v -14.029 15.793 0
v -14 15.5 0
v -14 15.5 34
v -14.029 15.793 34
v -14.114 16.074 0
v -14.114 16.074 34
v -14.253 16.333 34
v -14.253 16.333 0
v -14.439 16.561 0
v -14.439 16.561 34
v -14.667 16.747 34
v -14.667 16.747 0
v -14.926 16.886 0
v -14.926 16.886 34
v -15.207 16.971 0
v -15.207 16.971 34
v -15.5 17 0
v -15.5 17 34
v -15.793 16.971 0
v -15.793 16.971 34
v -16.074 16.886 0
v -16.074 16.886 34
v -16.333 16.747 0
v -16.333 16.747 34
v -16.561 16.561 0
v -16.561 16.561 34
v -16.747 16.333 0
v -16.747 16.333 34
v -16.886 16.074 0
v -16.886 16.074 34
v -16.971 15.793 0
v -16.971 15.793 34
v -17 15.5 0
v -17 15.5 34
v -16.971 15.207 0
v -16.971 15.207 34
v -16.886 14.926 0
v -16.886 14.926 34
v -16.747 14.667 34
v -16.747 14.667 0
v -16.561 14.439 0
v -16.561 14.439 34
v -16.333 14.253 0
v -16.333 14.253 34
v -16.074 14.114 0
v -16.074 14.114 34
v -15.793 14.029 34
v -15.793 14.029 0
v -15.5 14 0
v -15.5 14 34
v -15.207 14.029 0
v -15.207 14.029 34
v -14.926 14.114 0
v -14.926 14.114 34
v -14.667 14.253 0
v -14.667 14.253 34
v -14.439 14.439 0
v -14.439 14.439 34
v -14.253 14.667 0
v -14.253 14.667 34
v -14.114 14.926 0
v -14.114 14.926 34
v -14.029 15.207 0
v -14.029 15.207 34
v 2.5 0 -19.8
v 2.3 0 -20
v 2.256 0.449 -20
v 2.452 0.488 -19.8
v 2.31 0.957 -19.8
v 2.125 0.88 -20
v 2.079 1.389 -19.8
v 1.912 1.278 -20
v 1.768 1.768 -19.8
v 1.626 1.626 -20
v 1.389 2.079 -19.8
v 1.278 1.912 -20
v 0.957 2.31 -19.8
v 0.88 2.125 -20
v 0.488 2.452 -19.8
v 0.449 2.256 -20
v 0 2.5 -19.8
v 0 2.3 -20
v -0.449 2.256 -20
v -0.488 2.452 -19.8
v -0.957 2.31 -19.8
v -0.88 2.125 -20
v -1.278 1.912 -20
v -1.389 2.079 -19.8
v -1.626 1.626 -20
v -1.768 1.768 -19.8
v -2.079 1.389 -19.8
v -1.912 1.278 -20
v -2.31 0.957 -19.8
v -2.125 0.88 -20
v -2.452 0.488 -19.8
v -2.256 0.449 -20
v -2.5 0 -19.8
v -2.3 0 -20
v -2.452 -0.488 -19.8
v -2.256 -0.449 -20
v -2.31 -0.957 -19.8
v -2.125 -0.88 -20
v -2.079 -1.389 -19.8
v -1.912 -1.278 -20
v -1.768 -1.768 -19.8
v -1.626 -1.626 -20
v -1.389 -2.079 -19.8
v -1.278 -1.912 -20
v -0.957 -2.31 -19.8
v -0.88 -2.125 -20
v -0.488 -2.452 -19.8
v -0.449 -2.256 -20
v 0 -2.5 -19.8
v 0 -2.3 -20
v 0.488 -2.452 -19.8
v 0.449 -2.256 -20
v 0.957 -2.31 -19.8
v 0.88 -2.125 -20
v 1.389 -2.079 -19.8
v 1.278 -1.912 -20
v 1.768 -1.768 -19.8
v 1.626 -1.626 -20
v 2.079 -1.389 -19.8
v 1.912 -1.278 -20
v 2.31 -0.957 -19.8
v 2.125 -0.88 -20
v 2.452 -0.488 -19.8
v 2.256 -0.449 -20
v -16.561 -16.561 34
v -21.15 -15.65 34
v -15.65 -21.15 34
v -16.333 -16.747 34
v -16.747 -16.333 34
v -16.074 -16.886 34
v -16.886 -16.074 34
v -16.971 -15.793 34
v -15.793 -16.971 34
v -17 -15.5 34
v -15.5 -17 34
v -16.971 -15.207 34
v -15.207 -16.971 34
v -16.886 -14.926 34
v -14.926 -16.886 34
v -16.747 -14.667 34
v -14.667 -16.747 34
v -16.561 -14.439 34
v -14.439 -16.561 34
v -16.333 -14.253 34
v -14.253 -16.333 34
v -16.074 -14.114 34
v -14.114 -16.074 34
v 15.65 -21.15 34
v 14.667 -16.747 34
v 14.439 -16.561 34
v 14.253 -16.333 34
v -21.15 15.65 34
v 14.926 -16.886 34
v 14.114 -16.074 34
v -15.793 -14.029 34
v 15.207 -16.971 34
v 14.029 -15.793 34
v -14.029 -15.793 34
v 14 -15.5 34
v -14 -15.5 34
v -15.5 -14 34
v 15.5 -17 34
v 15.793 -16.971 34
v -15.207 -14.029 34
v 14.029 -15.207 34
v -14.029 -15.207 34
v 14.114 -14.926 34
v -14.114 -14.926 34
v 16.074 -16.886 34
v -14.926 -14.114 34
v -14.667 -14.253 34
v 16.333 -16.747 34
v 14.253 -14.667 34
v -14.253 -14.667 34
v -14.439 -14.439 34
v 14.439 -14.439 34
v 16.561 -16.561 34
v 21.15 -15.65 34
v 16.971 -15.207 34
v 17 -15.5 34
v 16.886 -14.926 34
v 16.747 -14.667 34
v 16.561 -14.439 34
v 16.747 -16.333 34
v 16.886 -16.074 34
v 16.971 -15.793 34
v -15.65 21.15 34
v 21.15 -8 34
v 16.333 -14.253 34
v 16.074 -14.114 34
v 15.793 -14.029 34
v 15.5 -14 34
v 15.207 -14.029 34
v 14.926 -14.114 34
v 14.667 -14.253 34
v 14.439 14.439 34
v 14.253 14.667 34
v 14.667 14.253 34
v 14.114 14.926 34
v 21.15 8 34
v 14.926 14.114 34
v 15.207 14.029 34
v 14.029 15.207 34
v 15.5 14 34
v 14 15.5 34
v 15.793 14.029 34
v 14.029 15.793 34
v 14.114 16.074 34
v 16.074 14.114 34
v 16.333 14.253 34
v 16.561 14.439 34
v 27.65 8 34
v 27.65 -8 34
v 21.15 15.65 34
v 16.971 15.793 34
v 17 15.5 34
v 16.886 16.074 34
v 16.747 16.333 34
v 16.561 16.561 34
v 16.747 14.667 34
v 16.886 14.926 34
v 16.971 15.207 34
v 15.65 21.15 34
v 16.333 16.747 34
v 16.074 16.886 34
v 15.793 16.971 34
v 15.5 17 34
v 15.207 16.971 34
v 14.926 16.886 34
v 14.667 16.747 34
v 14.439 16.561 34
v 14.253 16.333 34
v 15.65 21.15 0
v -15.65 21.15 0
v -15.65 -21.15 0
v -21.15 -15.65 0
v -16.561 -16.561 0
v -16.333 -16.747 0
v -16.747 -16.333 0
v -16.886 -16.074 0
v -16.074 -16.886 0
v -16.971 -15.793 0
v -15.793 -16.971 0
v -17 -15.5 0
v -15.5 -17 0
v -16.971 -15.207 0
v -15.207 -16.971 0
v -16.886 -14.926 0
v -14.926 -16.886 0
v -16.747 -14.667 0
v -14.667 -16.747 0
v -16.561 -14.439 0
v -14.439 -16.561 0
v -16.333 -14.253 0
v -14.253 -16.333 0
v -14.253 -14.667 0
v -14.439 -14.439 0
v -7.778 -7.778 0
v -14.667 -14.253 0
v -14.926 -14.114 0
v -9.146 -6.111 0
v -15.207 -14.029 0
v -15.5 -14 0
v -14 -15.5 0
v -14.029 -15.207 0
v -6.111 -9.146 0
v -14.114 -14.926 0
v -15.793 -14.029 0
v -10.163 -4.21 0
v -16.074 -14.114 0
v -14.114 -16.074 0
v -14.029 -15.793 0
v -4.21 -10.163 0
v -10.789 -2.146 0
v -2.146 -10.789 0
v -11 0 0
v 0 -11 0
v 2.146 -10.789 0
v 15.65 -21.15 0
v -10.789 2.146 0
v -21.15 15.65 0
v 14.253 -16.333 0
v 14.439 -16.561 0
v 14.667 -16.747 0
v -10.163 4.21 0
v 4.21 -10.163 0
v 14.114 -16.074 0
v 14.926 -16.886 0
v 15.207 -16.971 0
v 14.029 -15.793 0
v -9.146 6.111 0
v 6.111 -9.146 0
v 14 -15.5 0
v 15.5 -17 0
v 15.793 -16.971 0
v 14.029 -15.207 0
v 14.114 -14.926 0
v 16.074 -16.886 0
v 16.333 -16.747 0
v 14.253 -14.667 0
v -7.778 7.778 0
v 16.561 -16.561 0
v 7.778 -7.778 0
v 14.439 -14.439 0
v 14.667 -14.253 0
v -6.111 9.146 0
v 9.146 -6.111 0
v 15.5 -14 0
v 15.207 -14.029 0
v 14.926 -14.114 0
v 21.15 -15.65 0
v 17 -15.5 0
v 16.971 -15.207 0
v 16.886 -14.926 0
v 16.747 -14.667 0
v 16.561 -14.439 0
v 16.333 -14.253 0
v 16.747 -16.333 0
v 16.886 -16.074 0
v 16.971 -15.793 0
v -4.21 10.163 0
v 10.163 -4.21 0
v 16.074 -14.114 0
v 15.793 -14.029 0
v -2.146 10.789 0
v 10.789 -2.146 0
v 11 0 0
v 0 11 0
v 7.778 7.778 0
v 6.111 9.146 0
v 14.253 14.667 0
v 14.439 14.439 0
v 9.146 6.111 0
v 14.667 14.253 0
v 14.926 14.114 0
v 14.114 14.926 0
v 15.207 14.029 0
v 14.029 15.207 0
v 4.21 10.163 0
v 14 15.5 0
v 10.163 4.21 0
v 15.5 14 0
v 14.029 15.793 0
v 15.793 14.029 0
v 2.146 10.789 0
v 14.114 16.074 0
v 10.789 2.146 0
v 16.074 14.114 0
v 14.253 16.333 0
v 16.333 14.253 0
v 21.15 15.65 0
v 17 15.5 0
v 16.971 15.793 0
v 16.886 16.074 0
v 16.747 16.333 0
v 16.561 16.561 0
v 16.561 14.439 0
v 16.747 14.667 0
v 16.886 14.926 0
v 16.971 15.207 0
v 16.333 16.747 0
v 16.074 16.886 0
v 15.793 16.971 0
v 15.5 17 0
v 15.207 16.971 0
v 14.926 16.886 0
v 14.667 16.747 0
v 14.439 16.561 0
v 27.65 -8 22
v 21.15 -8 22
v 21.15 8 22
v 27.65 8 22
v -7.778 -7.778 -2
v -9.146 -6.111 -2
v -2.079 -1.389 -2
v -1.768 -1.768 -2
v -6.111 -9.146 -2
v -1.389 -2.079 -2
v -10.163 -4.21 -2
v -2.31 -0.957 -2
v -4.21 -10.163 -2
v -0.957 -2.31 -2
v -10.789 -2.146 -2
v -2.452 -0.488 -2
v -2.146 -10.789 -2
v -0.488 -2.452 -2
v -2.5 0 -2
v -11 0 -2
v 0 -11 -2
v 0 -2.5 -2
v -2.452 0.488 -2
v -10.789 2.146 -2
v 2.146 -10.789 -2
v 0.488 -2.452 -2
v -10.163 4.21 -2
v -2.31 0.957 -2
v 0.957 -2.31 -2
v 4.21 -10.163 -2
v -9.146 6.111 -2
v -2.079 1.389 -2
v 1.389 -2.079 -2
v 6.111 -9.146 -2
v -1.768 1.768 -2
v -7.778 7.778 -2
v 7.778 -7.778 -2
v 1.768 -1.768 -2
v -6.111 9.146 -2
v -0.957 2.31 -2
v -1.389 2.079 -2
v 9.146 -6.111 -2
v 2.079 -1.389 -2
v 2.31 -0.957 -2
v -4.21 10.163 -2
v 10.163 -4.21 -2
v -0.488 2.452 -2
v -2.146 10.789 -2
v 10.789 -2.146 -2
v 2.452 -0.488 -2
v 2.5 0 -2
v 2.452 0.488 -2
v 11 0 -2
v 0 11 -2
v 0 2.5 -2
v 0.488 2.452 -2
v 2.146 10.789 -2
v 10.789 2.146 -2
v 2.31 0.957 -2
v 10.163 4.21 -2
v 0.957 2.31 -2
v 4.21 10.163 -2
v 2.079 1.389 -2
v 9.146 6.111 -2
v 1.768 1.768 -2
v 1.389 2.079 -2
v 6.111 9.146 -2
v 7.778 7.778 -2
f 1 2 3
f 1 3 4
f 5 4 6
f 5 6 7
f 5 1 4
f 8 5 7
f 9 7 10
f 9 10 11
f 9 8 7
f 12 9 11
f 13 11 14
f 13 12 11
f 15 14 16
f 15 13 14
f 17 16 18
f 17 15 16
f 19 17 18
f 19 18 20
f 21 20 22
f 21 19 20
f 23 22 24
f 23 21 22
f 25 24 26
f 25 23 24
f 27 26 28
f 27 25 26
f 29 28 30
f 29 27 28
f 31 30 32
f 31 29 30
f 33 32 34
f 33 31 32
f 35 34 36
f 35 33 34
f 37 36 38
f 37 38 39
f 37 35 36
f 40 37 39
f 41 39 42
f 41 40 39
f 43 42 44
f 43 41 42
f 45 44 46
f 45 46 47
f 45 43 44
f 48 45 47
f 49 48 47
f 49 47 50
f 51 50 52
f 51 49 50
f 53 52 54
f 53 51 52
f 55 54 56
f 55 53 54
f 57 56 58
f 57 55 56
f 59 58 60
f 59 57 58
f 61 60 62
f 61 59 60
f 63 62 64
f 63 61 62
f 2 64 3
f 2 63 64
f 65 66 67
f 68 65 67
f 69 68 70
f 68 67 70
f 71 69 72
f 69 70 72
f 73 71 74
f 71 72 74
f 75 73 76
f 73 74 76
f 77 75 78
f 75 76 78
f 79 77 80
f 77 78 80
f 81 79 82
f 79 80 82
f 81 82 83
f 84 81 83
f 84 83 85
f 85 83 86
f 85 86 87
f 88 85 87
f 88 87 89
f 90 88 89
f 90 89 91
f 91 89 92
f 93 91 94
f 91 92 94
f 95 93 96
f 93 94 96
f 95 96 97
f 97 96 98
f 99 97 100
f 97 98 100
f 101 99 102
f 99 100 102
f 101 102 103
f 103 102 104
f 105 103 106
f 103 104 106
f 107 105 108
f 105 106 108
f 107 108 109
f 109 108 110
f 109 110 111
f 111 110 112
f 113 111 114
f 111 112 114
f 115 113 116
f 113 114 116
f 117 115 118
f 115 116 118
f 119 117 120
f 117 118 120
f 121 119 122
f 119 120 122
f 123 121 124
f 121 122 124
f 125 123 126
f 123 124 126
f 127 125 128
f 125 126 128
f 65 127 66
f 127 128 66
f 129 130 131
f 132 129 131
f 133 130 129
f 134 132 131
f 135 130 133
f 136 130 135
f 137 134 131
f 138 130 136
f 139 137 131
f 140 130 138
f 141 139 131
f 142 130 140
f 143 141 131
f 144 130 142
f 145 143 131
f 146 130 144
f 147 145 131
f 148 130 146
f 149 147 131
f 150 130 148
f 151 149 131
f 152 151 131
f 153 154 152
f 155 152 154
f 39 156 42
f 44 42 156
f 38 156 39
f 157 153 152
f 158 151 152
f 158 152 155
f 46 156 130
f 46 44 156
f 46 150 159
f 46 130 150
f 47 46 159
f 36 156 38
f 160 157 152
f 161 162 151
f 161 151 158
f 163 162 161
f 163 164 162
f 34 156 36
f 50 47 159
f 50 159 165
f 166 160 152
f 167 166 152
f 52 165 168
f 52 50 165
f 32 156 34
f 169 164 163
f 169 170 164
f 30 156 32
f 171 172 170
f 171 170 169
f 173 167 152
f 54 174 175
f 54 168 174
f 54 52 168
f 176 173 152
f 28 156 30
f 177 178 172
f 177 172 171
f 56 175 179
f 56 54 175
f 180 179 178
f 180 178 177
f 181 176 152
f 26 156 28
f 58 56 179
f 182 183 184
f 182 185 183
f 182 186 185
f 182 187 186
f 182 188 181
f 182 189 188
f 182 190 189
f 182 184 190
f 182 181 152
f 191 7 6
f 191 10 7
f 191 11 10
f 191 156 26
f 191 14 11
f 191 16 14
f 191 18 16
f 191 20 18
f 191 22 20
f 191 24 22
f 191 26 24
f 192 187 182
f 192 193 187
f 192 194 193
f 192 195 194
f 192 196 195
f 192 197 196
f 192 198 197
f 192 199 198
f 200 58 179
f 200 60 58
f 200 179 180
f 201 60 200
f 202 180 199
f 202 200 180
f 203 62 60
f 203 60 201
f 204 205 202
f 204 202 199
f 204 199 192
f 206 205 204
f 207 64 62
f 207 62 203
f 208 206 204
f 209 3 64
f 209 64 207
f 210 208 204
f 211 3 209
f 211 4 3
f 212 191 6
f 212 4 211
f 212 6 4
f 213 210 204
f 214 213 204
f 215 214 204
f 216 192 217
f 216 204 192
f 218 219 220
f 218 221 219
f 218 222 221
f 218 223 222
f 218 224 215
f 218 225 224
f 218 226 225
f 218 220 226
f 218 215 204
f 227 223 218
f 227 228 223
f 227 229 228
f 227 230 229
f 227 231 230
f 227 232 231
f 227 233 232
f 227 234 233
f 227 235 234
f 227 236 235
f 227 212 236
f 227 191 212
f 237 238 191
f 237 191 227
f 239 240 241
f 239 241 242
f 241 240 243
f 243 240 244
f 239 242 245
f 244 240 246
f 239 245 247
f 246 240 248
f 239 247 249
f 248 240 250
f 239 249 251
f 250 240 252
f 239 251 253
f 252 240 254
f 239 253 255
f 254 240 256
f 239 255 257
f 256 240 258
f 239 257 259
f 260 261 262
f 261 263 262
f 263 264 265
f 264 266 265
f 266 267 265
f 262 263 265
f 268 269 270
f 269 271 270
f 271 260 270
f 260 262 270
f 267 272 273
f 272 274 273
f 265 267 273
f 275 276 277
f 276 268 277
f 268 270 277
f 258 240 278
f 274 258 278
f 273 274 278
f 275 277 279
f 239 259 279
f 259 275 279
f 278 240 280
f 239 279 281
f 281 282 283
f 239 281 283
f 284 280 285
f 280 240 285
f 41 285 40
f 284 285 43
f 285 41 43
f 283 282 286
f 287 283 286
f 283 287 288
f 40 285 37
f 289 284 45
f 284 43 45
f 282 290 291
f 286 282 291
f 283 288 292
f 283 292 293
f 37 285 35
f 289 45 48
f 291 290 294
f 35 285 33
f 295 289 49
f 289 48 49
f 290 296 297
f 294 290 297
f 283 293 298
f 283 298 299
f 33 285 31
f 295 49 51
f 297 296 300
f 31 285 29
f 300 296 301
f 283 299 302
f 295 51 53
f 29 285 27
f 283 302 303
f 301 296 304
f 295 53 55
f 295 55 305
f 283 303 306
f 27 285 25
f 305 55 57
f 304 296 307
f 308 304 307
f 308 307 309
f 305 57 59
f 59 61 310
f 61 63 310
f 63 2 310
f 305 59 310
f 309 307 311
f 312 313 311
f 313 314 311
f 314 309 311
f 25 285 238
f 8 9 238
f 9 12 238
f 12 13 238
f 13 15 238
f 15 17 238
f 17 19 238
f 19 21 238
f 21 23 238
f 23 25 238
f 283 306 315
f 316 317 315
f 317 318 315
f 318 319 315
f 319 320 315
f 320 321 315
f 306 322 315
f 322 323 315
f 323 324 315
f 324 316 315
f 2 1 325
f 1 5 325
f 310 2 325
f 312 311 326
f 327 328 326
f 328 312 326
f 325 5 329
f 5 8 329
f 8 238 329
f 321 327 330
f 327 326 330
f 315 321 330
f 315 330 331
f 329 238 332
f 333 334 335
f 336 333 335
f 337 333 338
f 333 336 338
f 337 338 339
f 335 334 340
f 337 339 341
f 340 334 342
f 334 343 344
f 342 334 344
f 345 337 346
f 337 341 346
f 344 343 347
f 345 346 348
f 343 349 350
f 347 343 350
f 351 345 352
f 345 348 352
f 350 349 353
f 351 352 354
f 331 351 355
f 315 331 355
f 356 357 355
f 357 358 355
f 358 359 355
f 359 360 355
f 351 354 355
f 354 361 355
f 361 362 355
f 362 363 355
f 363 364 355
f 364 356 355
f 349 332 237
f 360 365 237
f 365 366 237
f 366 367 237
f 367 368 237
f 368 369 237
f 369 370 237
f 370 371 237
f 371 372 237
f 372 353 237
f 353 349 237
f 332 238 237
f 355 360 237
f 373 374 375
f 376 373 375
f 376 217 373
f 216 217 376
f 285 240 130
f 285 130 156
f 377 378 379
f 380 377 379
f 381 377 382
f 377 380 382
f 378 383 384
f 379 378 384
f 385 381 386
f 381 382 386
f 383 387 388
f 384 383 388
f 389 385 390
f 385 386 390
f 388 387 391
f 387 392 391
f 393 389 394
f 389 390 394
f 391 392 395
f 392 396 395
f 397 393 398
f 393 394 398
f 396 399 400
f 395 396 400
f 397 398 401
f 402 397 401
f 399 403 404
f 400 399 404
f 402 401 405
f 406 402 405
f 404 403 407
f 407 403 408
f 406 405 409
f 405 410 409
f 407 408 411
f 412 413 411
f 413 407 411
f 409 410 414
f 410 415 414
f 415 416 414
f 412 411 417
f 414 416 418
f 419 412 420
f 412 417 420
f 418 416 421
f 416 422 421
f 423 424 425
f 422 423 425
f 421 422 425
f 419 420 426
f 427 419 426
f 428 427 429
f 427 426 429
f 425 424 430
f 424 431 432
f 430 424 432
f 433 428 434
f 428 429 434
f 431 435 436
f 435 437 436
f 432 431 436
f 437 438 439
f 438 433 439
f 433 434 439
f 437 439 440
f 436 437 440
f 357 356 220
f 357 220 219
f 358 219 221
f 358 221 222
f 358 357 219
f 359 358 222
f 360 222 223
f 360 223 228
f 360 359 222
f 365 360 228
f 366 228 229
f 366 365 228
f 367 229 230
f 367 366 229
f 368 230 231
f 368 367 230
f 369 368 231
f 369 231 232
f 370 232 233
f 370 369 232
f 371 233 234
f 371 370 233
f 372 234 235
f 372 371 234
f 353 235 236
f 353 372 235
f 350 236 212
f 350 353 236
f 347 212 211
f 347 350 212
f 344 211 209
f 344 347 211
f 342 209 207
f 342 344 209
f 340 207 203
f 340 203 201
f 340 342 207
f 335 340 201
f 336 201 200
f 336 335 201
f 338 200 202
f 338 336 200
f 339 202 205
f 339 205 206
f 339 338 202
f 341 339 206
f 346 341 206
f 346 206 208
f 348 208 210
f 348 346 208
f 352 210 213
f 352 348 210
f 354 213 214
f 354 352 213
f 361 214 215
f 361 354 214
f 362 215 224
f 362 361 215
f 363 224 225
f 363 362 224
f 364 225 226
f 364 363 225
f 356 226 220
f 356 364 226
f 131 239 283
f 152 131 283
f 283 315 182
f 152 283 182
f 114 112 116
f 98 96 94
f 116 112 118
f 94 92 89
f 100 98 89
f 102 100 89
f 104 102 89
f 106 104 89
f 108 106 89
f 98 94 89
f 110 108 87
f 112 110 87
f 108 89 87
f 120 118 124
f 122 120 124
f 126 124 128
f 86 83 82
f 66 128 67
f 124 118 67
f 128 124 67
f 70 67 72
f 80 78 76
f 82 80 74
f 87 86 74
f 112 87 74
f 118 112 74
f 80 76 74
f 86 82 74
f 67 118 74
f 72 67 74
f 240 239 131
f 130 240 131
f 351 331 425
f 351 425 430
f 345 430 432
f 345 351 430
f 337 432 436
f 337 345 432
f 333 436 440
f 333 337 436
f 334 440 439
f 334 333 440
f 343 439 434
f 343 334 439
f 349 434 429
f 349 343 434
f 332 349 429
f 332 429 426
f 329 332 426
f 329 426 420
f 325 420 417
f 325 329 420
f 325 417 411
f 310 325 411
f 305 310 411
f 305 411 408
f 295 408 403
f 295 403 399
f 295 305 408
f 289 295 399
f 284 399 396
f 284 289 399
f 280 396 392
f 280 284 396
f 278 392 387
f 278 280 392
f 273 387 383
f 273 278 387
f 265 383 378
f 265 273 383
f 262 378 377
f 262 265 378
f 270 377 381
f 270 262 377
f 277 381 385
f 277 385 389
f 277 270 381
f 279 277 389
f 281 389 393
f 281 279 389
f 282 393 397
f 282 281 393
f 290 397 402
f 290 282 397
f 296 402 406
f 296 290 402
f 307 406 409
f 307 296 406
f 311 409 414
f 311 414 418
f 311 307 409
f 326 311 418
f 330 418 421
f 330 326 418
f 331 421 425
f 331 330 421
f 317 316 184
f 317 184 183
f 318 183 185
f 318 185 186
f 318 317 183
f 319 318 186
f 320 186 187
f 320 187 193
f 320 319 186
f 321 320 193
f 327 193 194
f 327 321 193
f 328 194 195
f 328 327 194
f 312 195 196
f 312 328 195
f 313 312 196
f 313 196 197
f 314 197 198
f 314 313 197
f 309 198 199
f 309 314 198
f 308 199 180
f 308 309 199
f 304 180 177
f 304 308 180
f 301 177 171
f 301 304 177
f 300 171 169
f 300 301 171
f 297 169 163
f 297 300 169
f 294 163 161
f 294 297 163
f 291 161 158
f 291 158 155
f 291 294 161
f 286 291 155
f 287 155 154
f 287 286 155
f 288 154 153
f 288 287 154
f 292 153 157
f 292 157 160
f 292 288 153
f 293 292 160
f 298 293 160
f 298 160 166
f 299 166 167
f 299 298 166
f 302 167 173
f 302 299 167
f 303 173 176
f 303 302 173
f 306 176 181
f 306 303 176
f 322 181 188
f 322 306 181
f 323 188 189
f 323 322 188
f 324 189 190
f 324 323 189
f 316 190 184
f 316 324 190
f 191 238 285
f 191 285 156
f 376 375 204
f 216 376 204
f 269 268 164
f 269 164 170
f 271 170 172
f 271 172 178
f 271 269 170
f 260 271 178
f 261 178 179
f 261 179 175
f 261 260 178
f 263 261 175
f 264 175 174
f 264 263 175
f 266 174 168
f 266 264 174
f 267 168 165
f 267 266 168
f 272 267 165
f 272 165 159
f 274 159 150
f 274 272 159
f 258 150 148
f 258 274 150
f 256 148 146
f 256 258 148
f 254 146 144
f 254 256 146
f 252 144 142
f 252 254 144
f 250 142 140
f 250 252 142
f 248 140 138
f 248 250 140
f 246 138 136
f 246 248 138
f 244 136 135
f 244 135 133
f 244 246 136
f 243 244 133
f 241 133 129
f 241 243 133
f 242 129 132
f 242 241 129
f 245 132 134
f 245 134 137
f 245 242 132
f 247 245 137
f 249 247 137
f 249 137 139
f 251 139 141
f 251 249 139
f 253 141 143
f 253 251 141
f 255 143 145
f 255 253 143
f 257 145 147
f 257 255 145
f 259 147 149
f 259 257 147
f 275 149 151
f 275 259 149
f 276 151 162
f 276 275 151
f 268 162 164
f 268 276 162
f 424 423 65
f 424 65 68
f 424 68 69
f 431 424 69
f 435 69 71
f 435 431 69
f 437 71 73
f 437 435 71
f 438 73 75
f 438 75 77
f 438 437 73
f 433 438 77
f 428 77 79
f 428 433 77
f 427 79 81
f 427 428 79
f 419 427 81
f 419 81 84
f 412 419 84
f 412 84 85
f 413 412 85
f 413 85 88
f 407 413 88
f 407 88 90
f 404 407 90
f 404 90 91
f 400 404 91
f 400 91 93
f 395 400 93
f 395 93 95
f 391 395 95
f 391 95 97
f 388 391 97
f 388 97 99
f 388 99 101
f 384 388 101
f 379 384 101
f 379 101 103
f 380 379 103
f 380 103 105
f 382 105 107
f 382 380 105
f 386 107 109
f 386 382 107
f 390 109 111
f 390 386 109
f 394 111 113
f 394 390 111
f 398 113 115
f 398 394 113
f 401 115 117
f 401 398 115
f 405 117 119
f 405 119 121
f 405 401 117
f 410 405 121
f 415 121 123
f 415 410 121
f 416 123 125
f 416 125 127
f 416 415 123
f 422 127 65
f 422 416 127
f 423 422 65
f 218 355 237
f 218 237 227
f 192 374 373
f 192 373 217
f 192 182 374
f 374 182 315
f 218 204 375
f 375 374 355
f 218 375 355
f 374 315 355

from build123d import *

# Parameters (mm, degrees)
F0_W     = 42.3
F0_H     = 42.3
F0_R     = 1.5
F0_R_2   = 11
F0_R_3   = 2.5
F1_DEPTH = 34
F2_DEPTH = 2
F3_DEPTH = 20
F4_SIZE  = 5.5
F5_SIZE  = 0.2
F6_W     = 16
F6_H     = 12
F7_DEPTH = 6.5


with BuildPart() as f1:
    # F0 (on Top) → F1 (new body)
    with BuildSketch(Plane.XY):
        Rectangle(F0_W, F0_H)
        with Locations((-15.5, -15.5)):
            Circle(F0_R, mode=Mode.SUBTRACT)
        with Locations((15.5, -15.5)):
            Circle(F0_R, mode=Mode.SUBTRACT)
        with Locations((-15.5, 15.5)):
            Circle(F0_R, mode=Mode.SUBTRACT)
        Circle(F0_R_2, mode=Mode.SUBTRACT)
        with Locations((15.5, 15.5)):
            Circle(F0_R, mode=Mode.SUBTRACT)
        Circle(F0_R_2)
        Circle(F0_R_3, mode=Mode.SUBTRACT)
        Circle(F0_R_3)
    extrude(amount=F1_DEPTH)

    # F0 (on Top) → F2 (join)
    with BuildSketch(Plane.XY):
        Circle(F0_R_2)
        Circle(F0_R_3, mode=Mode.SUBTRACT)
    extrude(amount=-F2_DEPTH)

    # F0 (on Top) → F3 (join)
    with BuildSketch(Plane.XY):
        Circle(F0_R_3)
    extrude(amount=-F3_DEPTH)

    # F4
    f4_edges = [f1.edges().sort_by_distance(p)[0] for p in [
        (-21.15, -21.15, 17),
        (21.15, -21.15, 17),
        (21.15, 21.15, 17),
        (-21.15, 21.15, 17),
    ]]
    chamfer(f4_edges, length=F4_SIZE)

    # F5
    f5_edges = [f1.edges().sort_by_distance(p)[0] for p in [
        (-2.5, 0, -20),
    ]]
    chamfer(f5_edges, length=F5_SIZE)

    # F6 (on face) → F7 (join)
    with BuildSketch(Plane.YZ.offset(21.15)):
        with Locations((0, 28)):
            Rectangle(F6_W, F6_H)
    extrude(amount=F7_DEPTH)


solid = f1.part
